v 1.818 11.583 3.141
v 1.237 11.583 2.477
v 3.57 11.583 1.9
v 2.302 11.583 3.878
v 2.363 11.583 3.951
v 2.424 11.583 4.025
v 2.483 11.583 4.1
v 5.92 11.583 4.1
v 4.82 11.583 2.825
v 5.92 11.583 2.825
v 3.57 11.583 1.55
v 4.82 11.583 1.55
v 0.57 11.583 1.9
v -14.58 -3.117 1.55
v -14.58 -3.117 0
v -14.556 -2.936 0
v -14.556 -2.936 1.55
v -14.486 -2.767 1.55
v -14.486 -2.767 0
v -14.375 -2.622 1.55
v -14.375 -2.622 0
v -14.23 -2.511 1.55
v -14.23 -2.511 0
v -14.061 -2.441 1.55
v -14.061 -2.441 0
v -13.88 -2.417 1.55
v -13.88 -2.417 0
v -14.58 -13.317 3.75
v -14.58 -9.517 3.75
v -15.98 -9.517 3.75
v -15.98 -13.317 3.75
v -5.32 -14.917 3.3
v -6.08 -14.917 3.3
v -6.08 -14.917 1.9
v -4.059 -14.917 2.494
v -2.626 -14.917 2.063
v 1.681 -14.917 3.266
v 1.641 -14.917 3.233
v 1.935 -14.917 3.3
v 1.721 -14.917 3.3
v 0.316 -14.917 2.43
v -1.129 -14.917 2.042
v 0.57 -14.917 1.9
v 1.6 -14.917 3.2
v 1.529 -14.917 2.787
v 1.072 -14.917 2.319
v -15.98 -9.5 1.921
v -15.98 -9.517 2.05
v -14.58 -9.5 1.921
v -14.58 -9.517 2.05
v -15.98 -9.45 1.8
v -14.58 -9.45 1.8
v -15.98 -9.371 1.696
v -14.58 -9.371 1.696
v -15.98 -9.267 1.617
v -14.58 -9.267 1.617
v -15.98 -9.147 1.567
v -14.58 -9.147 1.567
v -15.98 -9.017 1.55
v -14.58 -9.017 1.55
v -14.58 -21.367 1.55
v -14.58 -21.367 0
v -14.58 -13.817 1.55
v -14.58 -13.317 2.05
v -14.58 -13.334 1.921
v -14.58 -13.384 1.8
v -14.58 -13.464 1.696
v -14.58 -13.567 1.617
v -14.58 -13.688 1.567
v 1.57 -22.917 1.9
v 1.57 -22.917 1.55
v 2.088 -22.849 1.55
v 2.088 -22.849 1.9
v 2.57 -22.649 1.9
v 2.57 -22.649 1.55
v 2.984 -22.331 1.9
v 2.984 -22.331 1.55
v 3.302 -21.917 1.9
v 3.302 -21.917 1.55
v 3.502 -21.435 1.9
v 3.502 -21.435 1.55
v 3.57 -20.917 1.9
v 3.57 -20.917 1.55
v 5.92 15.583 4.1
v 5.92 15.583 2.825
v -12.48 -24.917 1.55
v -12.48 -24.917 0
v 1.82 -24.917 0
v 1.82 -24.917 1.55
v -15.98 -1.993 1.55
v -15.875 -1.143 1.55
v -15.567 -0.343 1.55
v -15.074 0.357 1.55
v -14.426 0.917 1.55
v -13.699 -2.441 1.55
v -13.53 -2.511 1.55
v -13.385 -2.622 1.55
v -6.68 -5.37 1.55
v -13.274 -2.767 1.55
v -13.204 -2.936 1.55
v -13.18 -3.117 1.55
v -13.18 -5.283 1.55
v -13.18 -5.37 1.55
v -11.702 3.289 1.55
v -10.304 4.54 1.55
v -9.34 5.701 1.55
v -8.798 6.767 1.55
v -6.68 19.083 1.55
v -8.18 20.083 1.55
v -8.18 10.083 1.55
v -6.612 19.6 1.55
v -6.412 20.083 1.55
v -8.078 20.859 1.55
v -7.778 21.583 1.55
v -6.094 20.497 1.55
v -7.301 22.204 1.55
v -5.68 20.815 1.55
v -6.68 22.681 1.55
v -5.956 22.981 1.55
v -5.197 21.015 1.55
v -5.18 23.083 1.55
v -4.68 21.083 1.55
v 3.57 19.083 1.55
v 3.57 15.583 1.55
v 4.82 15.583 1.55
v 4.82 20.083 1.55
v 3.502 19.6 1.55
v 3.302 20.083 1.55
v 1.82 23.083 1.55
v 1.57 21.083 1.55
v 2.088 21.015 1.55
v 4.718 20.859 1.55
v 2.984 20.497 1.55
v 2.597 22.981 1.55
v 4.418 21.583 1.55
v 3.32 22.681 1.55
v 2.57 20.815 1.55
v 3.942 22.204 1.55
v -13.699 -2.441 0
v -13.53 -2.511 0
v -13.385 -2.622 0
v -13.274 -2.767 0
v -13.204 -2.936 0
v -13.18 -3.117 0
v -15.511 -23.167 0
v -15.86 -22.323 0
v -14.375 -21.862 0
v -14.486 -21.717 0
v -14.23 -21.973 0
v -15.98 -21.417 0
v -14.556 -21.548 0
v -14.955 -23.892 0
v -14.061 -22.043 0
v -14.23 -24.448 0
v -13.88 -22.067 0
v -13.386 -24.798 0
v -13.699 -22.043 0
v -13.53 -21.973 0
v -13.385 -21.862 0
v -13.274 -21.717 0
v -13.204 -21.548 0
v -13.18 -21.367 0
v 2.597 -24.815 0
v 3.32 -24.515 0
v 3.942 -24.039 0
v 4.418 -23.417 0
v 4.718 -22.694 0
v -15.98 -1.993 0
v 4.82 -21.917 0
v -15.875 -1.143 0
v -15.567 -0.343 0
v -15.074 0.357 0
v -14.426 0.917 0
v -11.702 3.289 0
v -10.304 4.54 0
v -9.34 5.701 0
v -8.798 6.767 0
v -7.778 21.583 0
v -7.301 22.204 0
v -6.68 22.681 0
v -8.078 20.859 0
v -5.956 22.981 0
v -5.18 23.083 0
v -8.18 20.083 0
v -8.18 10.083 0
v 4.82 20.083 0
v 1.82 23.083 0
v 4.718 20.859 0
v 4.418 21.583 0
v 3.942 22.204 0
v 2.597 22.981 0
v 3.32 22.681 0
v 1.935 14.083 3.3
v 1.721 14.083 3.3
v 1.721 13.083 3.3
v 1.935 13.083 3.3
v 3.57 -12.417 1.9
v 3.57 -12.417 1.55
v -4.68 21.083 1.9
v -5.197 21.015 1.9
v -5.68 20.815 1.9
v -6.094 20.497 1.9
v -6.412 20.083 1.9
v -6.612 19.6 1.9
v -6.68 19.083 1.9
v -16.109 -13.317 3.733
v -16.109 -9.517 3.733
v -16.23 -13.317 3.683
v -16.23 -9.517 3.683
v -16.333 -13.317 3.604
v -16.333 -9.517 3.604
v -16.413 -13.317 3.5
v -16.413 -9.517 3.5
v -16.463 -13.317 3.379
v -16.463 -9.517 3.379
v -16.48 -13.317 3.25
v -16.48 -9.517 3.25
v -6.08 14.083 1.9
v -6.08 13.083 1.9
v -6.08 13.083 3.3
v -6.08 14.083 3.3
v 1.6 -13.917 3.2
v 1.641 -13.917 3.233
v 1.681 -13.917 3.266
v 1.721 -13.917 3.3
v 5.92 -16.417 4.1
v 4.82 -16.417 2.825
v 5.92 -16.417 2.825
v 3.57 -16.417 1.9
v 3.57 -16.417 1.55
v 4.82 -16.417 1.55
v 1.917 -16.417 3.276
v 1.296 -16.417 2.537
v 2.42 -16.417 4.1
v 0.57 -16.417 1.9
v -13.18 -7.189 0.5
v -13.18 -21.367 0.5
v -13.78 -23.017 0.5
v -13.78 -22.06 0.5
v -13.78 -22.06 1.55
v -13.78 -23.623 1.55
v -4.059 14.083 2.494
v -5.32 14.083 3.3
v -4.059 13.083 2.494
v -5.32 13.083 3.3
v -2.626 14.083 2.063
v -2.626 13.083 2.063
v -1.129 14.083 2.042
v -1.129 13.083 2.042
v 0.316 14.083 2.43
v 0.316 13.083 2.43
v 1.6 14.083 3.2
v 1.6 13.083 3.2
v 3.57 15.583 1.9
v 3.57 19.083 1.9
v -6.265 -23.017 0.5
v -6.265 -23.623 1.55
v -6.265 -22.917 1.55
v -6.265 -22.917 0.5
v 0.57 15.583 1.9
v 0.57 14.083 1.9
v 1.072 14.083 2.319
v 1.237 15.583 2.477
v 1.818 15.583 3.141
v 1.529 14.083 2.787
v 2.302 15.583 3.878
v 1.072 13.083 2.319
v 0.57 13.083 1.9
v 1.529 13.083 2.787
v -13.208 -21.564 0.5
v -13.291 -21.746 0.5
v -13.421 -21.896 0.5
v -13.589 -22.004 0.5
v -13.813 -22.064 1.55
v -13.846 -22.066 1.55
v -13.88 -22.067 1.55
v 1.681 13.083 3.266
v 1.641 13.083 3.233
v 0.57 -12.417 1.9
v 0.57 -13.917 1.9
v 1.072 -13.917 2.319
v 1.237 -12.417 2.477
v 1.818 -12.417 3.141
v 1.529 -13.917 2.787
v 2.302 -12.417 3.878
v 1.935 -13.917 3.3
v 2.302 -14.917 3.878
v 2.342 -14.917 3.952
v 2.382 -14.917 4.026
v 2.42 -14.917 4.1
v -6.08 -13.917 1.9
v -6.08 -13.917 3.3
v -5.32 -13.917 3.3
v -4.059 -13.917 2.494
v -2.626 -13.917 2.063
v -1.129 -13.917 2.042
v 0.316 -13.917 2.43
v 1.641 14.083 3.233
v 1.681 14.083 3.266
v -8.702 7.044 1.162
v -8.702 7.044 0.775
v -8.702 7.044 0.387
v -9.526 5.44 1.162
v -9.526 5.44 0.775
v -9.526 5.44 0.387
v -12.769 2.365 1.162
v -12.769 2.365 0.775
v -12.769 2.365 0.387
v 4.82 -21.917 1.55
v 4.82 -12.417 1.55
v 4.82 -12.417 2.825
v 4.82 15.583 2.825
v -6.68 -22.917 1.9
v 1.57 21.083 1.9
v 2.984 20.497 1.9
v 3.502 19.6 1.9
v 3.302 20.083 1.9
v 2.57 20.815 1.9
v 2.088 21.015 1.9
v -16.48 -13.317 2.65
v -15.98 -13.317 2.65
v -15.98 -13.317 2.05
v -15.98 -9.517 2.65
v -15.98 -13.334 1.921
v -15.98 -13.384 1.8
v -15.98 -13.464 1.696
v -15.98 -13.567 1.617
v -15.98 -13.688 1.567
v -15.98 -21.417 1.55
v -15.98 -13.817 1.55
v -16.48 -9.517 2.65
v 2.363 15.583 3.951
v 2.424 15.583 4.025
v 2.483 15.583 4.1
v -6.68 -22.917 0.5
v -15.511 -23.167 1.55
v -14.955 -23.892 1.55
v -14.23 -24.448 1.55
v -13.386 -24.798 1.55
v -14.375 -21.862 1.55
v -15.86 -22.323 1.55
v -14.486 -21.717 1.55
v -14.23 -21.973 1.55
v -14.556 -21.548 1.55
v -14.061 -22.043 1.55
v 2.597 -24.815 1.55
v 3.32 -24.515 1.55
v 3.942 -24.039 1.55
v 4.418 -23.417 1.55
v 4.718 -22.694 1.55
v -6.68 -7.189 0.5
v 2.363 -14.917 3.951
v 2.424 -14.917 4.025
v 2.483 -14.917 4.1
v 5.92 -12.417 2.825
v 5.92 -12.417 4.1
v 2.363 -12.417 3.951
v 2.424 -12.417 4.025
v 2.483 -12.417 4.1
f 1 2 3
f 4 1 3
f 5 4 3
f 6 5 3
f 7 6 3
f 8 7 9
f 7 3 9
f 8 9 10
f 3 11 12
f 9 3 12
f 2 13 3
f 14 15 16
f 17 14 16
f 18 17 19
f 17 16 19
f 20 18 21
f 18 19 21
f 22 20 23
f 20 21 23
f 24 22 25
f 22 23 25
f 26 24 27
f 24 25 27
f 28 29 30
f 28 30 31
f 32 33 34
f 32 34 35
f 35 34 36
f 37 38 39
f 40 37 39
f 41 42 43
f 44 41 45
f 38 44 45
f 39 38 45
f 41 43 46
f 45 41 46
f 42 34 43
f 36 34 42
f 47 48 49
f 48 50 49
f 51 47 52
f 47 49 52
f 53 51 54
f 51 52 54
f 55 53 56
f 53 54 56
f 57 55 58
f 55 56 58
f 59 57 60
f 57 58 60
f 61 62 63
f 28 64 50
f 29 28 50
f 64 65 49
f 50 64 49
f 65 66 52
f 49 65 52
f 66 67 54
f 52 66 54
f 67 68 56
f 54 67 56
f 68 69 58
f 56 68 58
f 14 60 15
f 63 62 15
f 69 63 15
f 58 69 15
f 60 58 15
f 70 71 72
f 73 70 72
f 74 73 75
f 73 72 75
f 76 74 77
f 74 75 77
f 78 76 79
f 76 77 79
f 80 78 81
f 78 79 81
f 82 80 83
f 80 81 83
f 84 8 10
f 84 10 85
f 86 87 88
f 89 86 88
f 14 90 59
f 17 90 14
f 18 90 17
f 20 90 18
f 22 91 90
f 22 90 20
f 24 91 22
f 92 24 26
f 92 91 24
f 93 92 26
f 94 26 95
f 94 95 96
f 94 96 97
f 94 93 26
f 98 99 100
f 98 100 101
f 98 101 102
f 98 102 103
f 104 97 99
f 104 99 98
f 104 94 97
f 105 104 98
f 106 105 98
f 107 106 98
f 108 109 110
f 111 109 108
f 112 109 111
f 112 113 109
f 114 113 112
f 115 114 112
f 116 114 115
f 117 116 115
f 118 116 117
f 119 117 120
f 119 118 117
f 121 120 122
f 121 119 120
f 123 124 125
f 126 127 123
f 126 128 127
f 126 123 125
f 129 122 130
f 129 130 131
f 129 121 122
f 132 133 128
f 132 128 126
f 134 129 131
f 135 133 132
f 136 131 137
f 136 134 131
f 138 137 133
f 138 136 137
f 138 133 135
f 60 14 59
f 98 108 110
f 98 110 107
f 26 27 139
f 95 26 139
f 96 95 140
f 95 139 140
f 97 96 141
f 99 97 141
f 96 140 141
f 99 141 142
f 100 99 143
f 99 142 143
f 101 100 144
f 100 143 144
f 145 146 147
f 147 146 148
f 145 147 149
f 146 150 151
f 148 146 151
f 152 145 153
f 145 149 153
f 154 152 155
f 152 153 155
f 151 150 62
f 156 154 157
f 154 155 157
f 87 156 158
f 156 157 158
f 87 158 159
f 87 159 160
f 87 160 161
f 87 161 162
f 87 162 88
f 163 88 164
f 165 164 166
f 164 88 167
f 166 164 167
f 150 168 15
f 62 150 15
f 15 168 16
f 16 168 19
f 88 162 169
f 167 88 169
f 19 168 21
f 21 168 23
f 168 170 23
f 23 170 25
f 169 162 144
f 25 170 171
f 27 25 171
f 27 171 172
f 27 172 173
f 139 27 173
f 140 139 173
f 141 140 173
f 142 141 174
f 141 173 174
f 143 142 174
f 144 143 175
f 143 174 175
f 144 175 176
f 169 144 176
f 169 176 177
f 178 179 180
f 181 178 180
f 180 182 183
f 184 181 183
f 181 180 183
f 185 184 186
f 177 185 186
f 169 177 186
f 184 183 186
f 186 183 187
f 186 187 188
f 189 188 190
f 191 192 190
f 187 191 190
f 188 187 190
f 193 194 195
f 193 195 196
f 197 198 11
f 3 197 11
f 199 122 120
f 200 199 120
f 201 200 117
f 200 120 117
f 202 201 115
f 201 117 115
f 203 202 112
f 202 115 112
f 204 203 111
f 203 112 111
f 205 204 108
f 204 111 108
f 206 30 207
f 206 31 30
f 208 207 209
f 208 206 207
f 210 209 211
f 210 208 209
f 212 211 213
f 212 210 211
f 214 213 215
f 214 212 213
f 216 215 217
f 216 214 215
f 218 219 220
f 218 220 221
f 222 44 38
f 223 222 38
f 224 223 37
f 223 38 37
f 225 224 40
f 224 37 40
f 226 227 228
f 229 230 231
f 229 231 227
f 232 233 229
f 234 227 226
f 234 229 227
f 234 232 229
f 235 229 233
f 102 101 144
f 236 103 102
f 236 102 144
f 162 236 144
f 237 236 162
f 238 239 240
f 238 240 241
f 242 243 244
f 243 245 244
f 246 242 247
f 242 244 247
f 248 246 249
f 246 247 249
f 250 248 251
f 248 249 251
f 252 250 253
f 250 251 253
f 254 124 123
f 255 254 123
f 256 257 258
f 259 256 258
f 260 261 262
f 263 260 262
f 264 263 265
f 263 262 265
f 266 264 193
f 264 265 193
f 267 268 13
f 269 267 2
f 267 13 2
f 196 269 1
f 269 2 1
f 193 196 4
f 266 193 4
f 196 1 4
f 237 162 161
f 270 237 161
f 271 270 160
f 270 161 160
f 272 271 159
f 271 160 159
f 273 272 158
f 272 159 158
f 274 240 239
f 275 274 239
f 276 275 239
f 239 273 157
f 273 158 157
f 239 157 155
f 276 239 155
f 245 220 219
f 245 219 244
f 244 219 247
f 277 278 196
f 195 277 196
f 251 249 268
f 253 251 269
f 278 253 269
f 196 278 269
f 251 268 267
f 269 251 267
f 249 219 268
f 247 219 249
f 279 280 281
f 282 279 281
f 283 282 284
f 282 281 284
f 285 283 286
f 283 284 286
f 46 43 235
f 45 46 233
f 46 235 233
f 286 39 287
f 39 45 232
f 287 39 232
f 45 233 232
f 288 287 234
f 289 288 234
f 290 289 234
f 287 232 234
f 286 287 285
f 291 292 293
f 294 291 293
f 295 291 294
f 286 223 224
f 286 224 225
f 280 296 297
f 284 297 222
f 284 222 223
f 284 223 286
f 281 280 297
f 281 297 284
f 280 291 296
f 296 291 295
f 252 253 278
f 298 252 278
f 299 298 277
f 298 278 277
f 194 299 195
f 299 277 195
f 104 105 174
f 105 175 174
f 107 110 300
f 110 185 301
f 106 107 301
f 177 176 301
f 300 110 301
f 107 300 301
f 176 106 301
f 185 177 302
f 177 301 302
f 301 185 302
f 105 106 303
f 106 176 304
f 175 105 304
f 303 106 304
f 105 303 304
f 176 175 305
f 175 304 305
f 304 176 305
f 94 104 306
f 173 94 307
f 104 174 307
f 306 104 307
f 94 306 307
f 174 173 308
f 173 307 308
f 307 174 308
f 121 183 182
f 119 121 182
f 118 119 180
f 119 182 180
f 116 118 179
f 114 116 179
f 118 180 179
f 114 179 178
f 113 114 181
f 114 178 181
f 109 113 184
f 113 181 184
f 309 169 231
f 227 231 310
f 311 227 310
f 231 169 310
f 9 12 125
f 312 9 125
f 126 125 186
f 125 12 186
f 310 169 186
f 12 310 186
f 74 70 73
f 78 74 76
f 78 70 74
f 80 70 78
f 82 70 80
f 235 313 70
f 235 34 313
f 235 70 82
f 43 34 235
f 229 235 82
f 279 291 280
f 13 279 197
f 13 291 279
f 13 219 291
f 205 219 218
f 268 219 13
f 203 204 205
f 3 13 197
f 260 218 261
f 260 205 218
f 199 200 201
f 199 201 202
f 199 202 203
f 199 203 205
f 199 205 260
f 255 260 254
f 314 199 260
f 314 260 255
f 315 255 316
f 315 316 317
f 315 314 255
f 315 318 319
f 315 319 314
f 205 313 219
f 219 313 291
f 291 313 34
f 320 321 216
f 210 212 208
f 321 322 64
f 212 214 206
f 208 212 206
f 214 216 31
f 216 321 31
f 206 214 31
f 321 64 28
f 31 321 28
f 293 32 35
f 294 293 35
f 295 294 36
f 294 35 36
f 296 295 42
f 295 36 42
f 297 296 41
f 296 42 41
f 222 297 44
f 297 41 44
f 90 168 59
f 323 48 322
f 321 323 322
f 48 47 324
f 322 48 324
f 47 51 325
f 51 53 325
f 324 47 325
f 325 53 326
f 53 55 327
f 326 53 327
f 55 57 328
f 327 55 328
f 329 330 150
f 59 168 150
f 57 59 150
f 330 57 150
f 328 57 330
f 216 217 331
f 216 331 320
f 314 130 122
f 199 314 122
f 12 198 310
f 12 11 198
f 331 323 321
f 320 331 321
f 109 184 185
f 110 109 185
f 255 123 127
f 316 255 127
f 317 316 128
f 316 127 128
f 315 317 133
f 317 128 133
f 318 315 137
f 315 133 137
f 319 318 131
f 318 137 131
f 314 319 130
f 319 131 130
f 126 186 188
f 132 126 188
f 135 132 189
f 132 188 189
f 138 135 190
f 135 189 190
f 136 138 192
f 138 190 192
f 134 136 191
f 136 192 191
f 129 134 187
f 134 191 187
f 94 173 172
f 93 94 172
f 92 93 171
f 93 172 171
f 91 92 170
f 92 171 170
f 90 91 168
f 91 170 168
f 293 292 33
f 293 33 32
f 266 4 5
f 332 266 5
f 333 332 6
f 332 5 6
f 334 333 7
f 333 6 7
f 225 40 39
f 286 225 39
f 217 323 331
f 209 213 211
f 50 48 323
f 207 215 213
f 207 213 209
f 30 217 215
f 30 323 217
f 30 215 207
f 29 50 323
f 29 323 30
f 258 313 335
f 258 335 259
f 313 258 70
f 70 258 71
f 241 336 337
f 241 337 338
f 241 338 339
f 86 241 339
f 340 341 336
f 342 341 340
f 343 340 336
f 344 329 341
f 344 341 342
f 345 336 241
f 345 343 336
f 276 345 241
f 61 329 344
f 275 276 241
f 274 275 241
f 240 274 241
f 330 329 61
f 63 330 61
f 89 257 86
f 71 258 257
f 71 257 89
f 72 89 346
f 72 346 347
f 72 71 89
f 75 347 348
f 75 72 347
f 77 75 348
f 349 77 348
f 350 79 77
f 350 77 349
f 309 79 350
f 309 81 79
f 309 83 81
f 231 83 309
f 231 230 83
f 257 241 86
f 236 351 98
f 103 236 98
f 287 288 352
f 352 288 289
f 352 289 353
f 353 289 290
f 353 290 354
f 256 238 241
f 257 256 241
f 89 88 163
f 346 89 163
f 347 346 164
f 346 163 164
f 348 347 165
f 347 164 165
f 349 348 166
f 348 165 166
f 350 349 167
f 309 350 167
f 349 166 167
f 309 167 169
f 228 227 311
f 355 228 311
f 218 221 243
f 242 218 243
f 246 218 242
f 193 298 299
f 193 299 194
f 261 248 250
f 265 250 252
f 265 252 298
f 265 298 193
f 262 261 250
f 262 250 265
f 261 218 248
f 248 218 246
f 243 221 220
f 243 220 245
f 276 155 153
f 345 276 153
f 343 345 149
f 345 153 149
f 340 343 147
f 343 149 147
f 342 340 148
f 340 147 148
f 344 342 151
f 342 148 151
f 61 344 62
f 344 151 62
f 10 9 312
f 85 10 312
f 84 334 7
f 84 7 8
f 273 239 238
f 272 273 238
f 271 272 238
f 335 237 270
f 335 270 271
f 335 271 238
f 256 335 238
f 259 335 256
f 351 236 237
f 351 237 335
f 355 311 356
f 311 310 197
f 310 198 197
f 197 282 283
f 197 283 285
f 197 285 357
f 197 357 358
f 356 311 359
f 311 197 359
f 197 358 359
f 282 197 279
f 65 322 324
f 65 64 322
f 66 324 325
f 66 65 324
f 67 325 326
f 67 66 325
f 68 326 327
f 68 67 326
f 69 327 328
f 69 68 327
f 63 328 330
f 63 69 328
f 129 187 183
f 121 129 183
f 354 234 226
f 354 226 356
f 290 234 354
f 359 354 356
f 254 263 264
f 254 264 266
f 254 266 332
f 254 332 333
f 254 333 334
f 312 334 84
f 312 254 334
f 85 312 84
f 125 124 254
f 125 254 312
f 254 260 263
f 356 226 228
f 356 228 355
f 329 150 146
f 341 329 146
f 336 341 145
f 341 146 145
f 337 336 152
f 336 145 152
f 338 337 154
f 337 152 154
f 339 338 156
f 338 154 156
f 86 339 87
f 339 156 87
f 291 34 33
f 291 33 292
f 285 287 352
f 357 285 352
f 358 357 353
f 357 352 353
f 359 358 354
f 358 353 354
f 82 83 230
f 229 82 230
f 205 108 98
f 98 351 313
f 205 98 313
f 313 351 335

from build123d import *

# Parameters (mm, degrees)
F1_DEPTH     = 1.55
F3_DEPTH     = 0.35
F4_W         = 8.65
F4_H         = 1
F5_DEPTH     = 1.3
F7_W         = 4.25
F7_H         = 4
F8_DEPTH     = 2.55
F10_DEPTH    = 39.5010001
F11_W        = 4
F11_H        = 1.275
F12_DEPTH    = 1.1
F13_W        = 8.65
F13_H        = 1
F14_DEPTH    = 1.4
F15_DEPTH    = 38.0010001
F17_DEPTH    = 1.4
F18_T4_DEPTH = 11.4290603676
F19_T4_DEPTH = 10.6517870966
F20_W        = 1.4
F20_H        = 3.8
F21_DEPTH    = 2.2
F22_W        = 3.8
F22_H        = 1.1
F23_DEPTH    = 0.5
F24_R        = 0.5


# Not quite as in the source:
# - a fillet or chamfer that OpenCascade refuses, or shapes differently, is made with other operations: its cross-section is extruded or revolved along the edge and cut away or added


with BuildPart() as f1:
    # F0 (on Top) → F1 (new body)
    with BuildSketch(Plane.XY):
        with BuildLine():
            Line((-12.4797472133, -24.9172599055), (1.8202527867, -24.9172599055))
            ThreePointArc((1.8202527867, -24.9172599055), (3.9415731303, -24.038580249), (4.8202527867, -21.9172599055))
            Line((4.8202527867, -21.9172599055), (4.8202527867, 20.0827400945))
            ThreePointArc((4.8202527867, 20.0827400945), (3.9415731303, 22.2040604381), (1.8202527867, 23.0827400945))
            Line((1.8202527867, 23.0827400945), (-5.1797472133, 23.0827400945))
            ThreePointArc((-5.1797472133, 23.0827400945), (-7.3010675568, 22.2040604381), (-8.1797472133, 20.0827400945))
            Line((-8.1797472133, 20.0827400945), (-8.1797472133, 10.0827400945))
            add(Edge.make_bspline(
                [(-8.1797472133, 10.0827400945), (-8.4297074571, 7.300546721), (-9.1785947804, 5.6351239407), (-11.0454632546, 3.7753203501), (-12.7602456599, 2.4755173938), (-13.6481305175, 1.4367913649), (-14.42578763, 0.9165801451)],
                knots=[0, 0, 0, 0, 0.3064186573, 0.5153311453, 0.7233584291, 0.9057268673, 0.9057268673, 0.9057268673, 0.9057268673], degree=3))
            ThreePointArc((-14.42578763, 0.9165801451), (-15.5669094587, -0.3434616219), (-15.9797472133, -1.9925308353))
            Line((-15.9797472133, -1.9925308353), (-15.9797472133, -21.4172599055))
            ThreePointArc((-15.9797472133, -21.4172599055), (-14.9546209474, -23.8921336396), (-12.4797472133, -24.9172599055))
        make_face()
        with BuildLine():
            Line((-14.5797472133, -21.3672599055), (-14.5797472133, -3.1172599055))
            ThreePointArc((-14.5797472133, -3.1172599055), (-14.3747219601, -2.6222851587), (-13.8797472133, -2.4172599055))
            ThreePointArc((-13.8797472133, -2.4172599055), (-13.3847724664, -2.6222851587), (-13.1797472133, -3.1172599055))
            Line((-13.1797472133, -3.1172599055), (-13.1797472133, -21.3672599055))
            ThreePointArc((-13.1797472133, -21.3672599055), (-13.3847724664, -21.8622346523), (-13.8797472133, -22.0672599055))
            ThreePointArc((-13.8797472133, -22.0672599055), (-14.3747219601, -21.8622346523), (-14.5797472133, -21.3672599055))
        make_face(mode=Mode.SUBTRACT)
    extrude(amount=F1_DEPTH)

    # F2 (on face) → F3 (join)
    with BuildSketch(Plane.XY.offset(1.55)):
        with BuildLine():
            Line((1.5702527867, 21.0827400945), (-4.6797472133, 21.0827400945))
            ThreePointArc((-4.6797472133, 21.0827400945), (-6.0939607756, 20.4969536569), (-6.6797472133, 19.0827400945))
            Line((-6.6797472133, 19.0827400945), (-6.6797472133, -22.9172599055))
            Line((-6.6797472133, -22.9172599055), (1.5702527867, -22.9172599055))
            ThreePointArc((1.5702527867, -22.9172599055), (2.9844663491, -22.3314734679), (3.5702527867, -20.9172599055))
            Line((3.5702527867, -20.9172599055), (3.5702527867, 19.0827400945))
            ThreePointArc((3.5702527867, 19.0827400945), (2.9844663491, 20.4969536569), (1.5702527867, 21.0827400945))
        make_face()
    extrude(amount=F3_DEPTH)

    # F4 (on face) → F5 (join)
    with BuildSketch(Plane.XY.offset(1.9)):
        with Locations((-1.7547472133, 13.5827400945)):
            Rectangle(F4_W, F4_H)
        with Locations((-1.7547472133, -14.4172599055)):
            Rectangle(F4_W, F4_H)
    extrude(amount=F5_DEPTH)

    # F7 (on face) → F8 (join)
    with BuildSketch(Plane.XY.offset(1.55)):
        with Locations((2.6952527867, -14.4172599055)):
            Rectangle(F7_W, F7_H)
        with Locations((2.6952527867, 13.5827400945)):
            Rectangle(F7_W, F7_H)
    extrude(amount=F8_DEPTH)

    # F9 (on face) → F10 (cut, through all)
    with BuildSketch(Plane.XZ.offset(16.4172599055)):
        with BuildLine():
            Line((0.5702527867, 4.1), (0.5702527867, 1.9))
            ThreePointArc((0.5702527867, 1.9), (1.620780987, 2.8944421952), (2.4202527867, 4.1))
            Line((2.4202527867, 4.1), (0.5702527867, 4.1))
        make_face()
    extrude(amount=-F10_DEPTH, mode=Mode.SUBTRACT)

    # F11 (on face) → F12 (join)
    with BuildSketch(Plane.YZ.offset(4.8202527867)):
        with Locations((-14.4172599055, 3.4625)):
            Rectangle(F11_W, F11_H)
        with Locations((13.5827400945, 3.4625)):
            Rectangle(F11_W, F11_H)
    extrude(amount=F12_DEPTH)

    # F13 (on face) → F14 (join)
    with BuildSketch(Plane.XY.offset(1.9)):
        with Locations((-1.7547472133, -14.4172599055)):
            Rectangle(F13_W, F13_H)
        with Locations((-1.7547472133, 13.5827400945)):
            Rectangle(F13_W, F13_H)
    extrude(amount=F14_DEPTH)

    # F6 (on face) → F15 (cut, through all)
    with BuildSketch(Plane.XZ.offset(14.9172599055)):
        with BuildLine():
            Line((1.6002527867, 3.2), (-5.1997472133, 3.2))
            ThreePointArc((-5.1997472133, 3.2), (-1.7997472133, 2), (1.6002527867, 3.2))
        make_face()
        with BuildLine():
            ThreePointArc((3.6169194534, 7.4166666667), (-4.1367978237, 12.3032270339), (-5.1997472133, 3.2))
            Line((-5.1997472133, 3.2), (1.6002527867, 3.2))
            ThreePointArc((1.6002527867, 3.2), (3.0868131539, 5.0796160563), (3.6169194534, 7.4166666667))
        make_face()
    extrude(amount=-F15_DEPTH, mode=Mode.SUBTRACT)

    # F16 (on face) → F17 (cut)
    with BuildSketch(Plane.XY.offset(1.9)):
        Polygon((-6.6797472133, -22.9172599055), (-6.6797472133, -5.2834198549), (-13.1797472133, -5.2834198549), (-13.7797472133, -5.2834198549), (-13.7797472133, -23.7172599055), (-6.2646348961, -23.7172599055), (-6.2646348961, -22.9172599055), align=None)
    extrude(amount=-F17_DEPTH, mode=Mode.SUBTRACT)

    # F18: chamfer of 1.1 x 1.9052558883 on 1 edges, made by hand


with BuildPart() as f18_tool2:
    # F18_s3 → F18_t4 (new body)
    with BuildSketch(Plane.YZ.offset(-1.7506868456)):
        Polygon((-7.1886757432, 0.5), (-5.2834198549, 1.6), (-5.2834198549, 0.5), align=None)
    extrude(amount=-F18_T4_DEPTH)

    split(bisect_by=Plane.XY.offset(1.55), keep=Keep.BOTTOM)


with BuildPart() as f1_1:
    add(f1.part)

    # F18_t1: union F18_tool2
    add(f18_tool2.part)

    # F19: chamfer of 0.7 x 1.2124355653 on 1 edges, made by hand


with BuildPart() as f19_tool2:
    # F19_s3 → F19_t4 (new body)
    with BuildSketch(Plane.YZ.offset(-13.7797472133)):
        Polygon((-23.0172599055, 0.5), (-23.7172599055, 1.7124355653), (-23.7172599055, 0.5), align=None)
    extrude(amount=F19_T4_DEPTH)

    split(bisect_by=Plane.XY.offset(1.55), keep=Keep.BOTTOM)


with BuildPart() as f1_2:
    add(f1_1.part)

    # F19_t1: union F19_tool2
    add(f19_tool2.part)

    # F20 (on face) → F21 (join)
    with BuildSketch(Plane.XY.offset(1.55)):
        with Locations((-15.2797472133, -11.4172599055)):
            Rectangle(F20_W, F20_H)
    extrude(amount=F21_DEPTH)

    # F22 (on face) → F23 (join)
    with BuildSketch(Plane(origin=(-15.9797472133, 0, 0), x_dir=(0, -1, 0), z_dir=(-1, 0, 0))):
        with Locations((11.4172599055, 3.2)):
            Rectangle(F22_W, F22_H)
    extrude(amount=F23_DEPTH)

    # F24
    f24_edges = [f1_2.edges().sort_by_distance(p)[0] for p in [
        (-15.279747, -13.31726, 1.55),
        (-15.279747, -9.51726, 1.55),
        (-16.479747, -11.41726, 3.75),
    ]]
    fillet(f24_edges, radius=F24_R)


solid = f1_2.part
